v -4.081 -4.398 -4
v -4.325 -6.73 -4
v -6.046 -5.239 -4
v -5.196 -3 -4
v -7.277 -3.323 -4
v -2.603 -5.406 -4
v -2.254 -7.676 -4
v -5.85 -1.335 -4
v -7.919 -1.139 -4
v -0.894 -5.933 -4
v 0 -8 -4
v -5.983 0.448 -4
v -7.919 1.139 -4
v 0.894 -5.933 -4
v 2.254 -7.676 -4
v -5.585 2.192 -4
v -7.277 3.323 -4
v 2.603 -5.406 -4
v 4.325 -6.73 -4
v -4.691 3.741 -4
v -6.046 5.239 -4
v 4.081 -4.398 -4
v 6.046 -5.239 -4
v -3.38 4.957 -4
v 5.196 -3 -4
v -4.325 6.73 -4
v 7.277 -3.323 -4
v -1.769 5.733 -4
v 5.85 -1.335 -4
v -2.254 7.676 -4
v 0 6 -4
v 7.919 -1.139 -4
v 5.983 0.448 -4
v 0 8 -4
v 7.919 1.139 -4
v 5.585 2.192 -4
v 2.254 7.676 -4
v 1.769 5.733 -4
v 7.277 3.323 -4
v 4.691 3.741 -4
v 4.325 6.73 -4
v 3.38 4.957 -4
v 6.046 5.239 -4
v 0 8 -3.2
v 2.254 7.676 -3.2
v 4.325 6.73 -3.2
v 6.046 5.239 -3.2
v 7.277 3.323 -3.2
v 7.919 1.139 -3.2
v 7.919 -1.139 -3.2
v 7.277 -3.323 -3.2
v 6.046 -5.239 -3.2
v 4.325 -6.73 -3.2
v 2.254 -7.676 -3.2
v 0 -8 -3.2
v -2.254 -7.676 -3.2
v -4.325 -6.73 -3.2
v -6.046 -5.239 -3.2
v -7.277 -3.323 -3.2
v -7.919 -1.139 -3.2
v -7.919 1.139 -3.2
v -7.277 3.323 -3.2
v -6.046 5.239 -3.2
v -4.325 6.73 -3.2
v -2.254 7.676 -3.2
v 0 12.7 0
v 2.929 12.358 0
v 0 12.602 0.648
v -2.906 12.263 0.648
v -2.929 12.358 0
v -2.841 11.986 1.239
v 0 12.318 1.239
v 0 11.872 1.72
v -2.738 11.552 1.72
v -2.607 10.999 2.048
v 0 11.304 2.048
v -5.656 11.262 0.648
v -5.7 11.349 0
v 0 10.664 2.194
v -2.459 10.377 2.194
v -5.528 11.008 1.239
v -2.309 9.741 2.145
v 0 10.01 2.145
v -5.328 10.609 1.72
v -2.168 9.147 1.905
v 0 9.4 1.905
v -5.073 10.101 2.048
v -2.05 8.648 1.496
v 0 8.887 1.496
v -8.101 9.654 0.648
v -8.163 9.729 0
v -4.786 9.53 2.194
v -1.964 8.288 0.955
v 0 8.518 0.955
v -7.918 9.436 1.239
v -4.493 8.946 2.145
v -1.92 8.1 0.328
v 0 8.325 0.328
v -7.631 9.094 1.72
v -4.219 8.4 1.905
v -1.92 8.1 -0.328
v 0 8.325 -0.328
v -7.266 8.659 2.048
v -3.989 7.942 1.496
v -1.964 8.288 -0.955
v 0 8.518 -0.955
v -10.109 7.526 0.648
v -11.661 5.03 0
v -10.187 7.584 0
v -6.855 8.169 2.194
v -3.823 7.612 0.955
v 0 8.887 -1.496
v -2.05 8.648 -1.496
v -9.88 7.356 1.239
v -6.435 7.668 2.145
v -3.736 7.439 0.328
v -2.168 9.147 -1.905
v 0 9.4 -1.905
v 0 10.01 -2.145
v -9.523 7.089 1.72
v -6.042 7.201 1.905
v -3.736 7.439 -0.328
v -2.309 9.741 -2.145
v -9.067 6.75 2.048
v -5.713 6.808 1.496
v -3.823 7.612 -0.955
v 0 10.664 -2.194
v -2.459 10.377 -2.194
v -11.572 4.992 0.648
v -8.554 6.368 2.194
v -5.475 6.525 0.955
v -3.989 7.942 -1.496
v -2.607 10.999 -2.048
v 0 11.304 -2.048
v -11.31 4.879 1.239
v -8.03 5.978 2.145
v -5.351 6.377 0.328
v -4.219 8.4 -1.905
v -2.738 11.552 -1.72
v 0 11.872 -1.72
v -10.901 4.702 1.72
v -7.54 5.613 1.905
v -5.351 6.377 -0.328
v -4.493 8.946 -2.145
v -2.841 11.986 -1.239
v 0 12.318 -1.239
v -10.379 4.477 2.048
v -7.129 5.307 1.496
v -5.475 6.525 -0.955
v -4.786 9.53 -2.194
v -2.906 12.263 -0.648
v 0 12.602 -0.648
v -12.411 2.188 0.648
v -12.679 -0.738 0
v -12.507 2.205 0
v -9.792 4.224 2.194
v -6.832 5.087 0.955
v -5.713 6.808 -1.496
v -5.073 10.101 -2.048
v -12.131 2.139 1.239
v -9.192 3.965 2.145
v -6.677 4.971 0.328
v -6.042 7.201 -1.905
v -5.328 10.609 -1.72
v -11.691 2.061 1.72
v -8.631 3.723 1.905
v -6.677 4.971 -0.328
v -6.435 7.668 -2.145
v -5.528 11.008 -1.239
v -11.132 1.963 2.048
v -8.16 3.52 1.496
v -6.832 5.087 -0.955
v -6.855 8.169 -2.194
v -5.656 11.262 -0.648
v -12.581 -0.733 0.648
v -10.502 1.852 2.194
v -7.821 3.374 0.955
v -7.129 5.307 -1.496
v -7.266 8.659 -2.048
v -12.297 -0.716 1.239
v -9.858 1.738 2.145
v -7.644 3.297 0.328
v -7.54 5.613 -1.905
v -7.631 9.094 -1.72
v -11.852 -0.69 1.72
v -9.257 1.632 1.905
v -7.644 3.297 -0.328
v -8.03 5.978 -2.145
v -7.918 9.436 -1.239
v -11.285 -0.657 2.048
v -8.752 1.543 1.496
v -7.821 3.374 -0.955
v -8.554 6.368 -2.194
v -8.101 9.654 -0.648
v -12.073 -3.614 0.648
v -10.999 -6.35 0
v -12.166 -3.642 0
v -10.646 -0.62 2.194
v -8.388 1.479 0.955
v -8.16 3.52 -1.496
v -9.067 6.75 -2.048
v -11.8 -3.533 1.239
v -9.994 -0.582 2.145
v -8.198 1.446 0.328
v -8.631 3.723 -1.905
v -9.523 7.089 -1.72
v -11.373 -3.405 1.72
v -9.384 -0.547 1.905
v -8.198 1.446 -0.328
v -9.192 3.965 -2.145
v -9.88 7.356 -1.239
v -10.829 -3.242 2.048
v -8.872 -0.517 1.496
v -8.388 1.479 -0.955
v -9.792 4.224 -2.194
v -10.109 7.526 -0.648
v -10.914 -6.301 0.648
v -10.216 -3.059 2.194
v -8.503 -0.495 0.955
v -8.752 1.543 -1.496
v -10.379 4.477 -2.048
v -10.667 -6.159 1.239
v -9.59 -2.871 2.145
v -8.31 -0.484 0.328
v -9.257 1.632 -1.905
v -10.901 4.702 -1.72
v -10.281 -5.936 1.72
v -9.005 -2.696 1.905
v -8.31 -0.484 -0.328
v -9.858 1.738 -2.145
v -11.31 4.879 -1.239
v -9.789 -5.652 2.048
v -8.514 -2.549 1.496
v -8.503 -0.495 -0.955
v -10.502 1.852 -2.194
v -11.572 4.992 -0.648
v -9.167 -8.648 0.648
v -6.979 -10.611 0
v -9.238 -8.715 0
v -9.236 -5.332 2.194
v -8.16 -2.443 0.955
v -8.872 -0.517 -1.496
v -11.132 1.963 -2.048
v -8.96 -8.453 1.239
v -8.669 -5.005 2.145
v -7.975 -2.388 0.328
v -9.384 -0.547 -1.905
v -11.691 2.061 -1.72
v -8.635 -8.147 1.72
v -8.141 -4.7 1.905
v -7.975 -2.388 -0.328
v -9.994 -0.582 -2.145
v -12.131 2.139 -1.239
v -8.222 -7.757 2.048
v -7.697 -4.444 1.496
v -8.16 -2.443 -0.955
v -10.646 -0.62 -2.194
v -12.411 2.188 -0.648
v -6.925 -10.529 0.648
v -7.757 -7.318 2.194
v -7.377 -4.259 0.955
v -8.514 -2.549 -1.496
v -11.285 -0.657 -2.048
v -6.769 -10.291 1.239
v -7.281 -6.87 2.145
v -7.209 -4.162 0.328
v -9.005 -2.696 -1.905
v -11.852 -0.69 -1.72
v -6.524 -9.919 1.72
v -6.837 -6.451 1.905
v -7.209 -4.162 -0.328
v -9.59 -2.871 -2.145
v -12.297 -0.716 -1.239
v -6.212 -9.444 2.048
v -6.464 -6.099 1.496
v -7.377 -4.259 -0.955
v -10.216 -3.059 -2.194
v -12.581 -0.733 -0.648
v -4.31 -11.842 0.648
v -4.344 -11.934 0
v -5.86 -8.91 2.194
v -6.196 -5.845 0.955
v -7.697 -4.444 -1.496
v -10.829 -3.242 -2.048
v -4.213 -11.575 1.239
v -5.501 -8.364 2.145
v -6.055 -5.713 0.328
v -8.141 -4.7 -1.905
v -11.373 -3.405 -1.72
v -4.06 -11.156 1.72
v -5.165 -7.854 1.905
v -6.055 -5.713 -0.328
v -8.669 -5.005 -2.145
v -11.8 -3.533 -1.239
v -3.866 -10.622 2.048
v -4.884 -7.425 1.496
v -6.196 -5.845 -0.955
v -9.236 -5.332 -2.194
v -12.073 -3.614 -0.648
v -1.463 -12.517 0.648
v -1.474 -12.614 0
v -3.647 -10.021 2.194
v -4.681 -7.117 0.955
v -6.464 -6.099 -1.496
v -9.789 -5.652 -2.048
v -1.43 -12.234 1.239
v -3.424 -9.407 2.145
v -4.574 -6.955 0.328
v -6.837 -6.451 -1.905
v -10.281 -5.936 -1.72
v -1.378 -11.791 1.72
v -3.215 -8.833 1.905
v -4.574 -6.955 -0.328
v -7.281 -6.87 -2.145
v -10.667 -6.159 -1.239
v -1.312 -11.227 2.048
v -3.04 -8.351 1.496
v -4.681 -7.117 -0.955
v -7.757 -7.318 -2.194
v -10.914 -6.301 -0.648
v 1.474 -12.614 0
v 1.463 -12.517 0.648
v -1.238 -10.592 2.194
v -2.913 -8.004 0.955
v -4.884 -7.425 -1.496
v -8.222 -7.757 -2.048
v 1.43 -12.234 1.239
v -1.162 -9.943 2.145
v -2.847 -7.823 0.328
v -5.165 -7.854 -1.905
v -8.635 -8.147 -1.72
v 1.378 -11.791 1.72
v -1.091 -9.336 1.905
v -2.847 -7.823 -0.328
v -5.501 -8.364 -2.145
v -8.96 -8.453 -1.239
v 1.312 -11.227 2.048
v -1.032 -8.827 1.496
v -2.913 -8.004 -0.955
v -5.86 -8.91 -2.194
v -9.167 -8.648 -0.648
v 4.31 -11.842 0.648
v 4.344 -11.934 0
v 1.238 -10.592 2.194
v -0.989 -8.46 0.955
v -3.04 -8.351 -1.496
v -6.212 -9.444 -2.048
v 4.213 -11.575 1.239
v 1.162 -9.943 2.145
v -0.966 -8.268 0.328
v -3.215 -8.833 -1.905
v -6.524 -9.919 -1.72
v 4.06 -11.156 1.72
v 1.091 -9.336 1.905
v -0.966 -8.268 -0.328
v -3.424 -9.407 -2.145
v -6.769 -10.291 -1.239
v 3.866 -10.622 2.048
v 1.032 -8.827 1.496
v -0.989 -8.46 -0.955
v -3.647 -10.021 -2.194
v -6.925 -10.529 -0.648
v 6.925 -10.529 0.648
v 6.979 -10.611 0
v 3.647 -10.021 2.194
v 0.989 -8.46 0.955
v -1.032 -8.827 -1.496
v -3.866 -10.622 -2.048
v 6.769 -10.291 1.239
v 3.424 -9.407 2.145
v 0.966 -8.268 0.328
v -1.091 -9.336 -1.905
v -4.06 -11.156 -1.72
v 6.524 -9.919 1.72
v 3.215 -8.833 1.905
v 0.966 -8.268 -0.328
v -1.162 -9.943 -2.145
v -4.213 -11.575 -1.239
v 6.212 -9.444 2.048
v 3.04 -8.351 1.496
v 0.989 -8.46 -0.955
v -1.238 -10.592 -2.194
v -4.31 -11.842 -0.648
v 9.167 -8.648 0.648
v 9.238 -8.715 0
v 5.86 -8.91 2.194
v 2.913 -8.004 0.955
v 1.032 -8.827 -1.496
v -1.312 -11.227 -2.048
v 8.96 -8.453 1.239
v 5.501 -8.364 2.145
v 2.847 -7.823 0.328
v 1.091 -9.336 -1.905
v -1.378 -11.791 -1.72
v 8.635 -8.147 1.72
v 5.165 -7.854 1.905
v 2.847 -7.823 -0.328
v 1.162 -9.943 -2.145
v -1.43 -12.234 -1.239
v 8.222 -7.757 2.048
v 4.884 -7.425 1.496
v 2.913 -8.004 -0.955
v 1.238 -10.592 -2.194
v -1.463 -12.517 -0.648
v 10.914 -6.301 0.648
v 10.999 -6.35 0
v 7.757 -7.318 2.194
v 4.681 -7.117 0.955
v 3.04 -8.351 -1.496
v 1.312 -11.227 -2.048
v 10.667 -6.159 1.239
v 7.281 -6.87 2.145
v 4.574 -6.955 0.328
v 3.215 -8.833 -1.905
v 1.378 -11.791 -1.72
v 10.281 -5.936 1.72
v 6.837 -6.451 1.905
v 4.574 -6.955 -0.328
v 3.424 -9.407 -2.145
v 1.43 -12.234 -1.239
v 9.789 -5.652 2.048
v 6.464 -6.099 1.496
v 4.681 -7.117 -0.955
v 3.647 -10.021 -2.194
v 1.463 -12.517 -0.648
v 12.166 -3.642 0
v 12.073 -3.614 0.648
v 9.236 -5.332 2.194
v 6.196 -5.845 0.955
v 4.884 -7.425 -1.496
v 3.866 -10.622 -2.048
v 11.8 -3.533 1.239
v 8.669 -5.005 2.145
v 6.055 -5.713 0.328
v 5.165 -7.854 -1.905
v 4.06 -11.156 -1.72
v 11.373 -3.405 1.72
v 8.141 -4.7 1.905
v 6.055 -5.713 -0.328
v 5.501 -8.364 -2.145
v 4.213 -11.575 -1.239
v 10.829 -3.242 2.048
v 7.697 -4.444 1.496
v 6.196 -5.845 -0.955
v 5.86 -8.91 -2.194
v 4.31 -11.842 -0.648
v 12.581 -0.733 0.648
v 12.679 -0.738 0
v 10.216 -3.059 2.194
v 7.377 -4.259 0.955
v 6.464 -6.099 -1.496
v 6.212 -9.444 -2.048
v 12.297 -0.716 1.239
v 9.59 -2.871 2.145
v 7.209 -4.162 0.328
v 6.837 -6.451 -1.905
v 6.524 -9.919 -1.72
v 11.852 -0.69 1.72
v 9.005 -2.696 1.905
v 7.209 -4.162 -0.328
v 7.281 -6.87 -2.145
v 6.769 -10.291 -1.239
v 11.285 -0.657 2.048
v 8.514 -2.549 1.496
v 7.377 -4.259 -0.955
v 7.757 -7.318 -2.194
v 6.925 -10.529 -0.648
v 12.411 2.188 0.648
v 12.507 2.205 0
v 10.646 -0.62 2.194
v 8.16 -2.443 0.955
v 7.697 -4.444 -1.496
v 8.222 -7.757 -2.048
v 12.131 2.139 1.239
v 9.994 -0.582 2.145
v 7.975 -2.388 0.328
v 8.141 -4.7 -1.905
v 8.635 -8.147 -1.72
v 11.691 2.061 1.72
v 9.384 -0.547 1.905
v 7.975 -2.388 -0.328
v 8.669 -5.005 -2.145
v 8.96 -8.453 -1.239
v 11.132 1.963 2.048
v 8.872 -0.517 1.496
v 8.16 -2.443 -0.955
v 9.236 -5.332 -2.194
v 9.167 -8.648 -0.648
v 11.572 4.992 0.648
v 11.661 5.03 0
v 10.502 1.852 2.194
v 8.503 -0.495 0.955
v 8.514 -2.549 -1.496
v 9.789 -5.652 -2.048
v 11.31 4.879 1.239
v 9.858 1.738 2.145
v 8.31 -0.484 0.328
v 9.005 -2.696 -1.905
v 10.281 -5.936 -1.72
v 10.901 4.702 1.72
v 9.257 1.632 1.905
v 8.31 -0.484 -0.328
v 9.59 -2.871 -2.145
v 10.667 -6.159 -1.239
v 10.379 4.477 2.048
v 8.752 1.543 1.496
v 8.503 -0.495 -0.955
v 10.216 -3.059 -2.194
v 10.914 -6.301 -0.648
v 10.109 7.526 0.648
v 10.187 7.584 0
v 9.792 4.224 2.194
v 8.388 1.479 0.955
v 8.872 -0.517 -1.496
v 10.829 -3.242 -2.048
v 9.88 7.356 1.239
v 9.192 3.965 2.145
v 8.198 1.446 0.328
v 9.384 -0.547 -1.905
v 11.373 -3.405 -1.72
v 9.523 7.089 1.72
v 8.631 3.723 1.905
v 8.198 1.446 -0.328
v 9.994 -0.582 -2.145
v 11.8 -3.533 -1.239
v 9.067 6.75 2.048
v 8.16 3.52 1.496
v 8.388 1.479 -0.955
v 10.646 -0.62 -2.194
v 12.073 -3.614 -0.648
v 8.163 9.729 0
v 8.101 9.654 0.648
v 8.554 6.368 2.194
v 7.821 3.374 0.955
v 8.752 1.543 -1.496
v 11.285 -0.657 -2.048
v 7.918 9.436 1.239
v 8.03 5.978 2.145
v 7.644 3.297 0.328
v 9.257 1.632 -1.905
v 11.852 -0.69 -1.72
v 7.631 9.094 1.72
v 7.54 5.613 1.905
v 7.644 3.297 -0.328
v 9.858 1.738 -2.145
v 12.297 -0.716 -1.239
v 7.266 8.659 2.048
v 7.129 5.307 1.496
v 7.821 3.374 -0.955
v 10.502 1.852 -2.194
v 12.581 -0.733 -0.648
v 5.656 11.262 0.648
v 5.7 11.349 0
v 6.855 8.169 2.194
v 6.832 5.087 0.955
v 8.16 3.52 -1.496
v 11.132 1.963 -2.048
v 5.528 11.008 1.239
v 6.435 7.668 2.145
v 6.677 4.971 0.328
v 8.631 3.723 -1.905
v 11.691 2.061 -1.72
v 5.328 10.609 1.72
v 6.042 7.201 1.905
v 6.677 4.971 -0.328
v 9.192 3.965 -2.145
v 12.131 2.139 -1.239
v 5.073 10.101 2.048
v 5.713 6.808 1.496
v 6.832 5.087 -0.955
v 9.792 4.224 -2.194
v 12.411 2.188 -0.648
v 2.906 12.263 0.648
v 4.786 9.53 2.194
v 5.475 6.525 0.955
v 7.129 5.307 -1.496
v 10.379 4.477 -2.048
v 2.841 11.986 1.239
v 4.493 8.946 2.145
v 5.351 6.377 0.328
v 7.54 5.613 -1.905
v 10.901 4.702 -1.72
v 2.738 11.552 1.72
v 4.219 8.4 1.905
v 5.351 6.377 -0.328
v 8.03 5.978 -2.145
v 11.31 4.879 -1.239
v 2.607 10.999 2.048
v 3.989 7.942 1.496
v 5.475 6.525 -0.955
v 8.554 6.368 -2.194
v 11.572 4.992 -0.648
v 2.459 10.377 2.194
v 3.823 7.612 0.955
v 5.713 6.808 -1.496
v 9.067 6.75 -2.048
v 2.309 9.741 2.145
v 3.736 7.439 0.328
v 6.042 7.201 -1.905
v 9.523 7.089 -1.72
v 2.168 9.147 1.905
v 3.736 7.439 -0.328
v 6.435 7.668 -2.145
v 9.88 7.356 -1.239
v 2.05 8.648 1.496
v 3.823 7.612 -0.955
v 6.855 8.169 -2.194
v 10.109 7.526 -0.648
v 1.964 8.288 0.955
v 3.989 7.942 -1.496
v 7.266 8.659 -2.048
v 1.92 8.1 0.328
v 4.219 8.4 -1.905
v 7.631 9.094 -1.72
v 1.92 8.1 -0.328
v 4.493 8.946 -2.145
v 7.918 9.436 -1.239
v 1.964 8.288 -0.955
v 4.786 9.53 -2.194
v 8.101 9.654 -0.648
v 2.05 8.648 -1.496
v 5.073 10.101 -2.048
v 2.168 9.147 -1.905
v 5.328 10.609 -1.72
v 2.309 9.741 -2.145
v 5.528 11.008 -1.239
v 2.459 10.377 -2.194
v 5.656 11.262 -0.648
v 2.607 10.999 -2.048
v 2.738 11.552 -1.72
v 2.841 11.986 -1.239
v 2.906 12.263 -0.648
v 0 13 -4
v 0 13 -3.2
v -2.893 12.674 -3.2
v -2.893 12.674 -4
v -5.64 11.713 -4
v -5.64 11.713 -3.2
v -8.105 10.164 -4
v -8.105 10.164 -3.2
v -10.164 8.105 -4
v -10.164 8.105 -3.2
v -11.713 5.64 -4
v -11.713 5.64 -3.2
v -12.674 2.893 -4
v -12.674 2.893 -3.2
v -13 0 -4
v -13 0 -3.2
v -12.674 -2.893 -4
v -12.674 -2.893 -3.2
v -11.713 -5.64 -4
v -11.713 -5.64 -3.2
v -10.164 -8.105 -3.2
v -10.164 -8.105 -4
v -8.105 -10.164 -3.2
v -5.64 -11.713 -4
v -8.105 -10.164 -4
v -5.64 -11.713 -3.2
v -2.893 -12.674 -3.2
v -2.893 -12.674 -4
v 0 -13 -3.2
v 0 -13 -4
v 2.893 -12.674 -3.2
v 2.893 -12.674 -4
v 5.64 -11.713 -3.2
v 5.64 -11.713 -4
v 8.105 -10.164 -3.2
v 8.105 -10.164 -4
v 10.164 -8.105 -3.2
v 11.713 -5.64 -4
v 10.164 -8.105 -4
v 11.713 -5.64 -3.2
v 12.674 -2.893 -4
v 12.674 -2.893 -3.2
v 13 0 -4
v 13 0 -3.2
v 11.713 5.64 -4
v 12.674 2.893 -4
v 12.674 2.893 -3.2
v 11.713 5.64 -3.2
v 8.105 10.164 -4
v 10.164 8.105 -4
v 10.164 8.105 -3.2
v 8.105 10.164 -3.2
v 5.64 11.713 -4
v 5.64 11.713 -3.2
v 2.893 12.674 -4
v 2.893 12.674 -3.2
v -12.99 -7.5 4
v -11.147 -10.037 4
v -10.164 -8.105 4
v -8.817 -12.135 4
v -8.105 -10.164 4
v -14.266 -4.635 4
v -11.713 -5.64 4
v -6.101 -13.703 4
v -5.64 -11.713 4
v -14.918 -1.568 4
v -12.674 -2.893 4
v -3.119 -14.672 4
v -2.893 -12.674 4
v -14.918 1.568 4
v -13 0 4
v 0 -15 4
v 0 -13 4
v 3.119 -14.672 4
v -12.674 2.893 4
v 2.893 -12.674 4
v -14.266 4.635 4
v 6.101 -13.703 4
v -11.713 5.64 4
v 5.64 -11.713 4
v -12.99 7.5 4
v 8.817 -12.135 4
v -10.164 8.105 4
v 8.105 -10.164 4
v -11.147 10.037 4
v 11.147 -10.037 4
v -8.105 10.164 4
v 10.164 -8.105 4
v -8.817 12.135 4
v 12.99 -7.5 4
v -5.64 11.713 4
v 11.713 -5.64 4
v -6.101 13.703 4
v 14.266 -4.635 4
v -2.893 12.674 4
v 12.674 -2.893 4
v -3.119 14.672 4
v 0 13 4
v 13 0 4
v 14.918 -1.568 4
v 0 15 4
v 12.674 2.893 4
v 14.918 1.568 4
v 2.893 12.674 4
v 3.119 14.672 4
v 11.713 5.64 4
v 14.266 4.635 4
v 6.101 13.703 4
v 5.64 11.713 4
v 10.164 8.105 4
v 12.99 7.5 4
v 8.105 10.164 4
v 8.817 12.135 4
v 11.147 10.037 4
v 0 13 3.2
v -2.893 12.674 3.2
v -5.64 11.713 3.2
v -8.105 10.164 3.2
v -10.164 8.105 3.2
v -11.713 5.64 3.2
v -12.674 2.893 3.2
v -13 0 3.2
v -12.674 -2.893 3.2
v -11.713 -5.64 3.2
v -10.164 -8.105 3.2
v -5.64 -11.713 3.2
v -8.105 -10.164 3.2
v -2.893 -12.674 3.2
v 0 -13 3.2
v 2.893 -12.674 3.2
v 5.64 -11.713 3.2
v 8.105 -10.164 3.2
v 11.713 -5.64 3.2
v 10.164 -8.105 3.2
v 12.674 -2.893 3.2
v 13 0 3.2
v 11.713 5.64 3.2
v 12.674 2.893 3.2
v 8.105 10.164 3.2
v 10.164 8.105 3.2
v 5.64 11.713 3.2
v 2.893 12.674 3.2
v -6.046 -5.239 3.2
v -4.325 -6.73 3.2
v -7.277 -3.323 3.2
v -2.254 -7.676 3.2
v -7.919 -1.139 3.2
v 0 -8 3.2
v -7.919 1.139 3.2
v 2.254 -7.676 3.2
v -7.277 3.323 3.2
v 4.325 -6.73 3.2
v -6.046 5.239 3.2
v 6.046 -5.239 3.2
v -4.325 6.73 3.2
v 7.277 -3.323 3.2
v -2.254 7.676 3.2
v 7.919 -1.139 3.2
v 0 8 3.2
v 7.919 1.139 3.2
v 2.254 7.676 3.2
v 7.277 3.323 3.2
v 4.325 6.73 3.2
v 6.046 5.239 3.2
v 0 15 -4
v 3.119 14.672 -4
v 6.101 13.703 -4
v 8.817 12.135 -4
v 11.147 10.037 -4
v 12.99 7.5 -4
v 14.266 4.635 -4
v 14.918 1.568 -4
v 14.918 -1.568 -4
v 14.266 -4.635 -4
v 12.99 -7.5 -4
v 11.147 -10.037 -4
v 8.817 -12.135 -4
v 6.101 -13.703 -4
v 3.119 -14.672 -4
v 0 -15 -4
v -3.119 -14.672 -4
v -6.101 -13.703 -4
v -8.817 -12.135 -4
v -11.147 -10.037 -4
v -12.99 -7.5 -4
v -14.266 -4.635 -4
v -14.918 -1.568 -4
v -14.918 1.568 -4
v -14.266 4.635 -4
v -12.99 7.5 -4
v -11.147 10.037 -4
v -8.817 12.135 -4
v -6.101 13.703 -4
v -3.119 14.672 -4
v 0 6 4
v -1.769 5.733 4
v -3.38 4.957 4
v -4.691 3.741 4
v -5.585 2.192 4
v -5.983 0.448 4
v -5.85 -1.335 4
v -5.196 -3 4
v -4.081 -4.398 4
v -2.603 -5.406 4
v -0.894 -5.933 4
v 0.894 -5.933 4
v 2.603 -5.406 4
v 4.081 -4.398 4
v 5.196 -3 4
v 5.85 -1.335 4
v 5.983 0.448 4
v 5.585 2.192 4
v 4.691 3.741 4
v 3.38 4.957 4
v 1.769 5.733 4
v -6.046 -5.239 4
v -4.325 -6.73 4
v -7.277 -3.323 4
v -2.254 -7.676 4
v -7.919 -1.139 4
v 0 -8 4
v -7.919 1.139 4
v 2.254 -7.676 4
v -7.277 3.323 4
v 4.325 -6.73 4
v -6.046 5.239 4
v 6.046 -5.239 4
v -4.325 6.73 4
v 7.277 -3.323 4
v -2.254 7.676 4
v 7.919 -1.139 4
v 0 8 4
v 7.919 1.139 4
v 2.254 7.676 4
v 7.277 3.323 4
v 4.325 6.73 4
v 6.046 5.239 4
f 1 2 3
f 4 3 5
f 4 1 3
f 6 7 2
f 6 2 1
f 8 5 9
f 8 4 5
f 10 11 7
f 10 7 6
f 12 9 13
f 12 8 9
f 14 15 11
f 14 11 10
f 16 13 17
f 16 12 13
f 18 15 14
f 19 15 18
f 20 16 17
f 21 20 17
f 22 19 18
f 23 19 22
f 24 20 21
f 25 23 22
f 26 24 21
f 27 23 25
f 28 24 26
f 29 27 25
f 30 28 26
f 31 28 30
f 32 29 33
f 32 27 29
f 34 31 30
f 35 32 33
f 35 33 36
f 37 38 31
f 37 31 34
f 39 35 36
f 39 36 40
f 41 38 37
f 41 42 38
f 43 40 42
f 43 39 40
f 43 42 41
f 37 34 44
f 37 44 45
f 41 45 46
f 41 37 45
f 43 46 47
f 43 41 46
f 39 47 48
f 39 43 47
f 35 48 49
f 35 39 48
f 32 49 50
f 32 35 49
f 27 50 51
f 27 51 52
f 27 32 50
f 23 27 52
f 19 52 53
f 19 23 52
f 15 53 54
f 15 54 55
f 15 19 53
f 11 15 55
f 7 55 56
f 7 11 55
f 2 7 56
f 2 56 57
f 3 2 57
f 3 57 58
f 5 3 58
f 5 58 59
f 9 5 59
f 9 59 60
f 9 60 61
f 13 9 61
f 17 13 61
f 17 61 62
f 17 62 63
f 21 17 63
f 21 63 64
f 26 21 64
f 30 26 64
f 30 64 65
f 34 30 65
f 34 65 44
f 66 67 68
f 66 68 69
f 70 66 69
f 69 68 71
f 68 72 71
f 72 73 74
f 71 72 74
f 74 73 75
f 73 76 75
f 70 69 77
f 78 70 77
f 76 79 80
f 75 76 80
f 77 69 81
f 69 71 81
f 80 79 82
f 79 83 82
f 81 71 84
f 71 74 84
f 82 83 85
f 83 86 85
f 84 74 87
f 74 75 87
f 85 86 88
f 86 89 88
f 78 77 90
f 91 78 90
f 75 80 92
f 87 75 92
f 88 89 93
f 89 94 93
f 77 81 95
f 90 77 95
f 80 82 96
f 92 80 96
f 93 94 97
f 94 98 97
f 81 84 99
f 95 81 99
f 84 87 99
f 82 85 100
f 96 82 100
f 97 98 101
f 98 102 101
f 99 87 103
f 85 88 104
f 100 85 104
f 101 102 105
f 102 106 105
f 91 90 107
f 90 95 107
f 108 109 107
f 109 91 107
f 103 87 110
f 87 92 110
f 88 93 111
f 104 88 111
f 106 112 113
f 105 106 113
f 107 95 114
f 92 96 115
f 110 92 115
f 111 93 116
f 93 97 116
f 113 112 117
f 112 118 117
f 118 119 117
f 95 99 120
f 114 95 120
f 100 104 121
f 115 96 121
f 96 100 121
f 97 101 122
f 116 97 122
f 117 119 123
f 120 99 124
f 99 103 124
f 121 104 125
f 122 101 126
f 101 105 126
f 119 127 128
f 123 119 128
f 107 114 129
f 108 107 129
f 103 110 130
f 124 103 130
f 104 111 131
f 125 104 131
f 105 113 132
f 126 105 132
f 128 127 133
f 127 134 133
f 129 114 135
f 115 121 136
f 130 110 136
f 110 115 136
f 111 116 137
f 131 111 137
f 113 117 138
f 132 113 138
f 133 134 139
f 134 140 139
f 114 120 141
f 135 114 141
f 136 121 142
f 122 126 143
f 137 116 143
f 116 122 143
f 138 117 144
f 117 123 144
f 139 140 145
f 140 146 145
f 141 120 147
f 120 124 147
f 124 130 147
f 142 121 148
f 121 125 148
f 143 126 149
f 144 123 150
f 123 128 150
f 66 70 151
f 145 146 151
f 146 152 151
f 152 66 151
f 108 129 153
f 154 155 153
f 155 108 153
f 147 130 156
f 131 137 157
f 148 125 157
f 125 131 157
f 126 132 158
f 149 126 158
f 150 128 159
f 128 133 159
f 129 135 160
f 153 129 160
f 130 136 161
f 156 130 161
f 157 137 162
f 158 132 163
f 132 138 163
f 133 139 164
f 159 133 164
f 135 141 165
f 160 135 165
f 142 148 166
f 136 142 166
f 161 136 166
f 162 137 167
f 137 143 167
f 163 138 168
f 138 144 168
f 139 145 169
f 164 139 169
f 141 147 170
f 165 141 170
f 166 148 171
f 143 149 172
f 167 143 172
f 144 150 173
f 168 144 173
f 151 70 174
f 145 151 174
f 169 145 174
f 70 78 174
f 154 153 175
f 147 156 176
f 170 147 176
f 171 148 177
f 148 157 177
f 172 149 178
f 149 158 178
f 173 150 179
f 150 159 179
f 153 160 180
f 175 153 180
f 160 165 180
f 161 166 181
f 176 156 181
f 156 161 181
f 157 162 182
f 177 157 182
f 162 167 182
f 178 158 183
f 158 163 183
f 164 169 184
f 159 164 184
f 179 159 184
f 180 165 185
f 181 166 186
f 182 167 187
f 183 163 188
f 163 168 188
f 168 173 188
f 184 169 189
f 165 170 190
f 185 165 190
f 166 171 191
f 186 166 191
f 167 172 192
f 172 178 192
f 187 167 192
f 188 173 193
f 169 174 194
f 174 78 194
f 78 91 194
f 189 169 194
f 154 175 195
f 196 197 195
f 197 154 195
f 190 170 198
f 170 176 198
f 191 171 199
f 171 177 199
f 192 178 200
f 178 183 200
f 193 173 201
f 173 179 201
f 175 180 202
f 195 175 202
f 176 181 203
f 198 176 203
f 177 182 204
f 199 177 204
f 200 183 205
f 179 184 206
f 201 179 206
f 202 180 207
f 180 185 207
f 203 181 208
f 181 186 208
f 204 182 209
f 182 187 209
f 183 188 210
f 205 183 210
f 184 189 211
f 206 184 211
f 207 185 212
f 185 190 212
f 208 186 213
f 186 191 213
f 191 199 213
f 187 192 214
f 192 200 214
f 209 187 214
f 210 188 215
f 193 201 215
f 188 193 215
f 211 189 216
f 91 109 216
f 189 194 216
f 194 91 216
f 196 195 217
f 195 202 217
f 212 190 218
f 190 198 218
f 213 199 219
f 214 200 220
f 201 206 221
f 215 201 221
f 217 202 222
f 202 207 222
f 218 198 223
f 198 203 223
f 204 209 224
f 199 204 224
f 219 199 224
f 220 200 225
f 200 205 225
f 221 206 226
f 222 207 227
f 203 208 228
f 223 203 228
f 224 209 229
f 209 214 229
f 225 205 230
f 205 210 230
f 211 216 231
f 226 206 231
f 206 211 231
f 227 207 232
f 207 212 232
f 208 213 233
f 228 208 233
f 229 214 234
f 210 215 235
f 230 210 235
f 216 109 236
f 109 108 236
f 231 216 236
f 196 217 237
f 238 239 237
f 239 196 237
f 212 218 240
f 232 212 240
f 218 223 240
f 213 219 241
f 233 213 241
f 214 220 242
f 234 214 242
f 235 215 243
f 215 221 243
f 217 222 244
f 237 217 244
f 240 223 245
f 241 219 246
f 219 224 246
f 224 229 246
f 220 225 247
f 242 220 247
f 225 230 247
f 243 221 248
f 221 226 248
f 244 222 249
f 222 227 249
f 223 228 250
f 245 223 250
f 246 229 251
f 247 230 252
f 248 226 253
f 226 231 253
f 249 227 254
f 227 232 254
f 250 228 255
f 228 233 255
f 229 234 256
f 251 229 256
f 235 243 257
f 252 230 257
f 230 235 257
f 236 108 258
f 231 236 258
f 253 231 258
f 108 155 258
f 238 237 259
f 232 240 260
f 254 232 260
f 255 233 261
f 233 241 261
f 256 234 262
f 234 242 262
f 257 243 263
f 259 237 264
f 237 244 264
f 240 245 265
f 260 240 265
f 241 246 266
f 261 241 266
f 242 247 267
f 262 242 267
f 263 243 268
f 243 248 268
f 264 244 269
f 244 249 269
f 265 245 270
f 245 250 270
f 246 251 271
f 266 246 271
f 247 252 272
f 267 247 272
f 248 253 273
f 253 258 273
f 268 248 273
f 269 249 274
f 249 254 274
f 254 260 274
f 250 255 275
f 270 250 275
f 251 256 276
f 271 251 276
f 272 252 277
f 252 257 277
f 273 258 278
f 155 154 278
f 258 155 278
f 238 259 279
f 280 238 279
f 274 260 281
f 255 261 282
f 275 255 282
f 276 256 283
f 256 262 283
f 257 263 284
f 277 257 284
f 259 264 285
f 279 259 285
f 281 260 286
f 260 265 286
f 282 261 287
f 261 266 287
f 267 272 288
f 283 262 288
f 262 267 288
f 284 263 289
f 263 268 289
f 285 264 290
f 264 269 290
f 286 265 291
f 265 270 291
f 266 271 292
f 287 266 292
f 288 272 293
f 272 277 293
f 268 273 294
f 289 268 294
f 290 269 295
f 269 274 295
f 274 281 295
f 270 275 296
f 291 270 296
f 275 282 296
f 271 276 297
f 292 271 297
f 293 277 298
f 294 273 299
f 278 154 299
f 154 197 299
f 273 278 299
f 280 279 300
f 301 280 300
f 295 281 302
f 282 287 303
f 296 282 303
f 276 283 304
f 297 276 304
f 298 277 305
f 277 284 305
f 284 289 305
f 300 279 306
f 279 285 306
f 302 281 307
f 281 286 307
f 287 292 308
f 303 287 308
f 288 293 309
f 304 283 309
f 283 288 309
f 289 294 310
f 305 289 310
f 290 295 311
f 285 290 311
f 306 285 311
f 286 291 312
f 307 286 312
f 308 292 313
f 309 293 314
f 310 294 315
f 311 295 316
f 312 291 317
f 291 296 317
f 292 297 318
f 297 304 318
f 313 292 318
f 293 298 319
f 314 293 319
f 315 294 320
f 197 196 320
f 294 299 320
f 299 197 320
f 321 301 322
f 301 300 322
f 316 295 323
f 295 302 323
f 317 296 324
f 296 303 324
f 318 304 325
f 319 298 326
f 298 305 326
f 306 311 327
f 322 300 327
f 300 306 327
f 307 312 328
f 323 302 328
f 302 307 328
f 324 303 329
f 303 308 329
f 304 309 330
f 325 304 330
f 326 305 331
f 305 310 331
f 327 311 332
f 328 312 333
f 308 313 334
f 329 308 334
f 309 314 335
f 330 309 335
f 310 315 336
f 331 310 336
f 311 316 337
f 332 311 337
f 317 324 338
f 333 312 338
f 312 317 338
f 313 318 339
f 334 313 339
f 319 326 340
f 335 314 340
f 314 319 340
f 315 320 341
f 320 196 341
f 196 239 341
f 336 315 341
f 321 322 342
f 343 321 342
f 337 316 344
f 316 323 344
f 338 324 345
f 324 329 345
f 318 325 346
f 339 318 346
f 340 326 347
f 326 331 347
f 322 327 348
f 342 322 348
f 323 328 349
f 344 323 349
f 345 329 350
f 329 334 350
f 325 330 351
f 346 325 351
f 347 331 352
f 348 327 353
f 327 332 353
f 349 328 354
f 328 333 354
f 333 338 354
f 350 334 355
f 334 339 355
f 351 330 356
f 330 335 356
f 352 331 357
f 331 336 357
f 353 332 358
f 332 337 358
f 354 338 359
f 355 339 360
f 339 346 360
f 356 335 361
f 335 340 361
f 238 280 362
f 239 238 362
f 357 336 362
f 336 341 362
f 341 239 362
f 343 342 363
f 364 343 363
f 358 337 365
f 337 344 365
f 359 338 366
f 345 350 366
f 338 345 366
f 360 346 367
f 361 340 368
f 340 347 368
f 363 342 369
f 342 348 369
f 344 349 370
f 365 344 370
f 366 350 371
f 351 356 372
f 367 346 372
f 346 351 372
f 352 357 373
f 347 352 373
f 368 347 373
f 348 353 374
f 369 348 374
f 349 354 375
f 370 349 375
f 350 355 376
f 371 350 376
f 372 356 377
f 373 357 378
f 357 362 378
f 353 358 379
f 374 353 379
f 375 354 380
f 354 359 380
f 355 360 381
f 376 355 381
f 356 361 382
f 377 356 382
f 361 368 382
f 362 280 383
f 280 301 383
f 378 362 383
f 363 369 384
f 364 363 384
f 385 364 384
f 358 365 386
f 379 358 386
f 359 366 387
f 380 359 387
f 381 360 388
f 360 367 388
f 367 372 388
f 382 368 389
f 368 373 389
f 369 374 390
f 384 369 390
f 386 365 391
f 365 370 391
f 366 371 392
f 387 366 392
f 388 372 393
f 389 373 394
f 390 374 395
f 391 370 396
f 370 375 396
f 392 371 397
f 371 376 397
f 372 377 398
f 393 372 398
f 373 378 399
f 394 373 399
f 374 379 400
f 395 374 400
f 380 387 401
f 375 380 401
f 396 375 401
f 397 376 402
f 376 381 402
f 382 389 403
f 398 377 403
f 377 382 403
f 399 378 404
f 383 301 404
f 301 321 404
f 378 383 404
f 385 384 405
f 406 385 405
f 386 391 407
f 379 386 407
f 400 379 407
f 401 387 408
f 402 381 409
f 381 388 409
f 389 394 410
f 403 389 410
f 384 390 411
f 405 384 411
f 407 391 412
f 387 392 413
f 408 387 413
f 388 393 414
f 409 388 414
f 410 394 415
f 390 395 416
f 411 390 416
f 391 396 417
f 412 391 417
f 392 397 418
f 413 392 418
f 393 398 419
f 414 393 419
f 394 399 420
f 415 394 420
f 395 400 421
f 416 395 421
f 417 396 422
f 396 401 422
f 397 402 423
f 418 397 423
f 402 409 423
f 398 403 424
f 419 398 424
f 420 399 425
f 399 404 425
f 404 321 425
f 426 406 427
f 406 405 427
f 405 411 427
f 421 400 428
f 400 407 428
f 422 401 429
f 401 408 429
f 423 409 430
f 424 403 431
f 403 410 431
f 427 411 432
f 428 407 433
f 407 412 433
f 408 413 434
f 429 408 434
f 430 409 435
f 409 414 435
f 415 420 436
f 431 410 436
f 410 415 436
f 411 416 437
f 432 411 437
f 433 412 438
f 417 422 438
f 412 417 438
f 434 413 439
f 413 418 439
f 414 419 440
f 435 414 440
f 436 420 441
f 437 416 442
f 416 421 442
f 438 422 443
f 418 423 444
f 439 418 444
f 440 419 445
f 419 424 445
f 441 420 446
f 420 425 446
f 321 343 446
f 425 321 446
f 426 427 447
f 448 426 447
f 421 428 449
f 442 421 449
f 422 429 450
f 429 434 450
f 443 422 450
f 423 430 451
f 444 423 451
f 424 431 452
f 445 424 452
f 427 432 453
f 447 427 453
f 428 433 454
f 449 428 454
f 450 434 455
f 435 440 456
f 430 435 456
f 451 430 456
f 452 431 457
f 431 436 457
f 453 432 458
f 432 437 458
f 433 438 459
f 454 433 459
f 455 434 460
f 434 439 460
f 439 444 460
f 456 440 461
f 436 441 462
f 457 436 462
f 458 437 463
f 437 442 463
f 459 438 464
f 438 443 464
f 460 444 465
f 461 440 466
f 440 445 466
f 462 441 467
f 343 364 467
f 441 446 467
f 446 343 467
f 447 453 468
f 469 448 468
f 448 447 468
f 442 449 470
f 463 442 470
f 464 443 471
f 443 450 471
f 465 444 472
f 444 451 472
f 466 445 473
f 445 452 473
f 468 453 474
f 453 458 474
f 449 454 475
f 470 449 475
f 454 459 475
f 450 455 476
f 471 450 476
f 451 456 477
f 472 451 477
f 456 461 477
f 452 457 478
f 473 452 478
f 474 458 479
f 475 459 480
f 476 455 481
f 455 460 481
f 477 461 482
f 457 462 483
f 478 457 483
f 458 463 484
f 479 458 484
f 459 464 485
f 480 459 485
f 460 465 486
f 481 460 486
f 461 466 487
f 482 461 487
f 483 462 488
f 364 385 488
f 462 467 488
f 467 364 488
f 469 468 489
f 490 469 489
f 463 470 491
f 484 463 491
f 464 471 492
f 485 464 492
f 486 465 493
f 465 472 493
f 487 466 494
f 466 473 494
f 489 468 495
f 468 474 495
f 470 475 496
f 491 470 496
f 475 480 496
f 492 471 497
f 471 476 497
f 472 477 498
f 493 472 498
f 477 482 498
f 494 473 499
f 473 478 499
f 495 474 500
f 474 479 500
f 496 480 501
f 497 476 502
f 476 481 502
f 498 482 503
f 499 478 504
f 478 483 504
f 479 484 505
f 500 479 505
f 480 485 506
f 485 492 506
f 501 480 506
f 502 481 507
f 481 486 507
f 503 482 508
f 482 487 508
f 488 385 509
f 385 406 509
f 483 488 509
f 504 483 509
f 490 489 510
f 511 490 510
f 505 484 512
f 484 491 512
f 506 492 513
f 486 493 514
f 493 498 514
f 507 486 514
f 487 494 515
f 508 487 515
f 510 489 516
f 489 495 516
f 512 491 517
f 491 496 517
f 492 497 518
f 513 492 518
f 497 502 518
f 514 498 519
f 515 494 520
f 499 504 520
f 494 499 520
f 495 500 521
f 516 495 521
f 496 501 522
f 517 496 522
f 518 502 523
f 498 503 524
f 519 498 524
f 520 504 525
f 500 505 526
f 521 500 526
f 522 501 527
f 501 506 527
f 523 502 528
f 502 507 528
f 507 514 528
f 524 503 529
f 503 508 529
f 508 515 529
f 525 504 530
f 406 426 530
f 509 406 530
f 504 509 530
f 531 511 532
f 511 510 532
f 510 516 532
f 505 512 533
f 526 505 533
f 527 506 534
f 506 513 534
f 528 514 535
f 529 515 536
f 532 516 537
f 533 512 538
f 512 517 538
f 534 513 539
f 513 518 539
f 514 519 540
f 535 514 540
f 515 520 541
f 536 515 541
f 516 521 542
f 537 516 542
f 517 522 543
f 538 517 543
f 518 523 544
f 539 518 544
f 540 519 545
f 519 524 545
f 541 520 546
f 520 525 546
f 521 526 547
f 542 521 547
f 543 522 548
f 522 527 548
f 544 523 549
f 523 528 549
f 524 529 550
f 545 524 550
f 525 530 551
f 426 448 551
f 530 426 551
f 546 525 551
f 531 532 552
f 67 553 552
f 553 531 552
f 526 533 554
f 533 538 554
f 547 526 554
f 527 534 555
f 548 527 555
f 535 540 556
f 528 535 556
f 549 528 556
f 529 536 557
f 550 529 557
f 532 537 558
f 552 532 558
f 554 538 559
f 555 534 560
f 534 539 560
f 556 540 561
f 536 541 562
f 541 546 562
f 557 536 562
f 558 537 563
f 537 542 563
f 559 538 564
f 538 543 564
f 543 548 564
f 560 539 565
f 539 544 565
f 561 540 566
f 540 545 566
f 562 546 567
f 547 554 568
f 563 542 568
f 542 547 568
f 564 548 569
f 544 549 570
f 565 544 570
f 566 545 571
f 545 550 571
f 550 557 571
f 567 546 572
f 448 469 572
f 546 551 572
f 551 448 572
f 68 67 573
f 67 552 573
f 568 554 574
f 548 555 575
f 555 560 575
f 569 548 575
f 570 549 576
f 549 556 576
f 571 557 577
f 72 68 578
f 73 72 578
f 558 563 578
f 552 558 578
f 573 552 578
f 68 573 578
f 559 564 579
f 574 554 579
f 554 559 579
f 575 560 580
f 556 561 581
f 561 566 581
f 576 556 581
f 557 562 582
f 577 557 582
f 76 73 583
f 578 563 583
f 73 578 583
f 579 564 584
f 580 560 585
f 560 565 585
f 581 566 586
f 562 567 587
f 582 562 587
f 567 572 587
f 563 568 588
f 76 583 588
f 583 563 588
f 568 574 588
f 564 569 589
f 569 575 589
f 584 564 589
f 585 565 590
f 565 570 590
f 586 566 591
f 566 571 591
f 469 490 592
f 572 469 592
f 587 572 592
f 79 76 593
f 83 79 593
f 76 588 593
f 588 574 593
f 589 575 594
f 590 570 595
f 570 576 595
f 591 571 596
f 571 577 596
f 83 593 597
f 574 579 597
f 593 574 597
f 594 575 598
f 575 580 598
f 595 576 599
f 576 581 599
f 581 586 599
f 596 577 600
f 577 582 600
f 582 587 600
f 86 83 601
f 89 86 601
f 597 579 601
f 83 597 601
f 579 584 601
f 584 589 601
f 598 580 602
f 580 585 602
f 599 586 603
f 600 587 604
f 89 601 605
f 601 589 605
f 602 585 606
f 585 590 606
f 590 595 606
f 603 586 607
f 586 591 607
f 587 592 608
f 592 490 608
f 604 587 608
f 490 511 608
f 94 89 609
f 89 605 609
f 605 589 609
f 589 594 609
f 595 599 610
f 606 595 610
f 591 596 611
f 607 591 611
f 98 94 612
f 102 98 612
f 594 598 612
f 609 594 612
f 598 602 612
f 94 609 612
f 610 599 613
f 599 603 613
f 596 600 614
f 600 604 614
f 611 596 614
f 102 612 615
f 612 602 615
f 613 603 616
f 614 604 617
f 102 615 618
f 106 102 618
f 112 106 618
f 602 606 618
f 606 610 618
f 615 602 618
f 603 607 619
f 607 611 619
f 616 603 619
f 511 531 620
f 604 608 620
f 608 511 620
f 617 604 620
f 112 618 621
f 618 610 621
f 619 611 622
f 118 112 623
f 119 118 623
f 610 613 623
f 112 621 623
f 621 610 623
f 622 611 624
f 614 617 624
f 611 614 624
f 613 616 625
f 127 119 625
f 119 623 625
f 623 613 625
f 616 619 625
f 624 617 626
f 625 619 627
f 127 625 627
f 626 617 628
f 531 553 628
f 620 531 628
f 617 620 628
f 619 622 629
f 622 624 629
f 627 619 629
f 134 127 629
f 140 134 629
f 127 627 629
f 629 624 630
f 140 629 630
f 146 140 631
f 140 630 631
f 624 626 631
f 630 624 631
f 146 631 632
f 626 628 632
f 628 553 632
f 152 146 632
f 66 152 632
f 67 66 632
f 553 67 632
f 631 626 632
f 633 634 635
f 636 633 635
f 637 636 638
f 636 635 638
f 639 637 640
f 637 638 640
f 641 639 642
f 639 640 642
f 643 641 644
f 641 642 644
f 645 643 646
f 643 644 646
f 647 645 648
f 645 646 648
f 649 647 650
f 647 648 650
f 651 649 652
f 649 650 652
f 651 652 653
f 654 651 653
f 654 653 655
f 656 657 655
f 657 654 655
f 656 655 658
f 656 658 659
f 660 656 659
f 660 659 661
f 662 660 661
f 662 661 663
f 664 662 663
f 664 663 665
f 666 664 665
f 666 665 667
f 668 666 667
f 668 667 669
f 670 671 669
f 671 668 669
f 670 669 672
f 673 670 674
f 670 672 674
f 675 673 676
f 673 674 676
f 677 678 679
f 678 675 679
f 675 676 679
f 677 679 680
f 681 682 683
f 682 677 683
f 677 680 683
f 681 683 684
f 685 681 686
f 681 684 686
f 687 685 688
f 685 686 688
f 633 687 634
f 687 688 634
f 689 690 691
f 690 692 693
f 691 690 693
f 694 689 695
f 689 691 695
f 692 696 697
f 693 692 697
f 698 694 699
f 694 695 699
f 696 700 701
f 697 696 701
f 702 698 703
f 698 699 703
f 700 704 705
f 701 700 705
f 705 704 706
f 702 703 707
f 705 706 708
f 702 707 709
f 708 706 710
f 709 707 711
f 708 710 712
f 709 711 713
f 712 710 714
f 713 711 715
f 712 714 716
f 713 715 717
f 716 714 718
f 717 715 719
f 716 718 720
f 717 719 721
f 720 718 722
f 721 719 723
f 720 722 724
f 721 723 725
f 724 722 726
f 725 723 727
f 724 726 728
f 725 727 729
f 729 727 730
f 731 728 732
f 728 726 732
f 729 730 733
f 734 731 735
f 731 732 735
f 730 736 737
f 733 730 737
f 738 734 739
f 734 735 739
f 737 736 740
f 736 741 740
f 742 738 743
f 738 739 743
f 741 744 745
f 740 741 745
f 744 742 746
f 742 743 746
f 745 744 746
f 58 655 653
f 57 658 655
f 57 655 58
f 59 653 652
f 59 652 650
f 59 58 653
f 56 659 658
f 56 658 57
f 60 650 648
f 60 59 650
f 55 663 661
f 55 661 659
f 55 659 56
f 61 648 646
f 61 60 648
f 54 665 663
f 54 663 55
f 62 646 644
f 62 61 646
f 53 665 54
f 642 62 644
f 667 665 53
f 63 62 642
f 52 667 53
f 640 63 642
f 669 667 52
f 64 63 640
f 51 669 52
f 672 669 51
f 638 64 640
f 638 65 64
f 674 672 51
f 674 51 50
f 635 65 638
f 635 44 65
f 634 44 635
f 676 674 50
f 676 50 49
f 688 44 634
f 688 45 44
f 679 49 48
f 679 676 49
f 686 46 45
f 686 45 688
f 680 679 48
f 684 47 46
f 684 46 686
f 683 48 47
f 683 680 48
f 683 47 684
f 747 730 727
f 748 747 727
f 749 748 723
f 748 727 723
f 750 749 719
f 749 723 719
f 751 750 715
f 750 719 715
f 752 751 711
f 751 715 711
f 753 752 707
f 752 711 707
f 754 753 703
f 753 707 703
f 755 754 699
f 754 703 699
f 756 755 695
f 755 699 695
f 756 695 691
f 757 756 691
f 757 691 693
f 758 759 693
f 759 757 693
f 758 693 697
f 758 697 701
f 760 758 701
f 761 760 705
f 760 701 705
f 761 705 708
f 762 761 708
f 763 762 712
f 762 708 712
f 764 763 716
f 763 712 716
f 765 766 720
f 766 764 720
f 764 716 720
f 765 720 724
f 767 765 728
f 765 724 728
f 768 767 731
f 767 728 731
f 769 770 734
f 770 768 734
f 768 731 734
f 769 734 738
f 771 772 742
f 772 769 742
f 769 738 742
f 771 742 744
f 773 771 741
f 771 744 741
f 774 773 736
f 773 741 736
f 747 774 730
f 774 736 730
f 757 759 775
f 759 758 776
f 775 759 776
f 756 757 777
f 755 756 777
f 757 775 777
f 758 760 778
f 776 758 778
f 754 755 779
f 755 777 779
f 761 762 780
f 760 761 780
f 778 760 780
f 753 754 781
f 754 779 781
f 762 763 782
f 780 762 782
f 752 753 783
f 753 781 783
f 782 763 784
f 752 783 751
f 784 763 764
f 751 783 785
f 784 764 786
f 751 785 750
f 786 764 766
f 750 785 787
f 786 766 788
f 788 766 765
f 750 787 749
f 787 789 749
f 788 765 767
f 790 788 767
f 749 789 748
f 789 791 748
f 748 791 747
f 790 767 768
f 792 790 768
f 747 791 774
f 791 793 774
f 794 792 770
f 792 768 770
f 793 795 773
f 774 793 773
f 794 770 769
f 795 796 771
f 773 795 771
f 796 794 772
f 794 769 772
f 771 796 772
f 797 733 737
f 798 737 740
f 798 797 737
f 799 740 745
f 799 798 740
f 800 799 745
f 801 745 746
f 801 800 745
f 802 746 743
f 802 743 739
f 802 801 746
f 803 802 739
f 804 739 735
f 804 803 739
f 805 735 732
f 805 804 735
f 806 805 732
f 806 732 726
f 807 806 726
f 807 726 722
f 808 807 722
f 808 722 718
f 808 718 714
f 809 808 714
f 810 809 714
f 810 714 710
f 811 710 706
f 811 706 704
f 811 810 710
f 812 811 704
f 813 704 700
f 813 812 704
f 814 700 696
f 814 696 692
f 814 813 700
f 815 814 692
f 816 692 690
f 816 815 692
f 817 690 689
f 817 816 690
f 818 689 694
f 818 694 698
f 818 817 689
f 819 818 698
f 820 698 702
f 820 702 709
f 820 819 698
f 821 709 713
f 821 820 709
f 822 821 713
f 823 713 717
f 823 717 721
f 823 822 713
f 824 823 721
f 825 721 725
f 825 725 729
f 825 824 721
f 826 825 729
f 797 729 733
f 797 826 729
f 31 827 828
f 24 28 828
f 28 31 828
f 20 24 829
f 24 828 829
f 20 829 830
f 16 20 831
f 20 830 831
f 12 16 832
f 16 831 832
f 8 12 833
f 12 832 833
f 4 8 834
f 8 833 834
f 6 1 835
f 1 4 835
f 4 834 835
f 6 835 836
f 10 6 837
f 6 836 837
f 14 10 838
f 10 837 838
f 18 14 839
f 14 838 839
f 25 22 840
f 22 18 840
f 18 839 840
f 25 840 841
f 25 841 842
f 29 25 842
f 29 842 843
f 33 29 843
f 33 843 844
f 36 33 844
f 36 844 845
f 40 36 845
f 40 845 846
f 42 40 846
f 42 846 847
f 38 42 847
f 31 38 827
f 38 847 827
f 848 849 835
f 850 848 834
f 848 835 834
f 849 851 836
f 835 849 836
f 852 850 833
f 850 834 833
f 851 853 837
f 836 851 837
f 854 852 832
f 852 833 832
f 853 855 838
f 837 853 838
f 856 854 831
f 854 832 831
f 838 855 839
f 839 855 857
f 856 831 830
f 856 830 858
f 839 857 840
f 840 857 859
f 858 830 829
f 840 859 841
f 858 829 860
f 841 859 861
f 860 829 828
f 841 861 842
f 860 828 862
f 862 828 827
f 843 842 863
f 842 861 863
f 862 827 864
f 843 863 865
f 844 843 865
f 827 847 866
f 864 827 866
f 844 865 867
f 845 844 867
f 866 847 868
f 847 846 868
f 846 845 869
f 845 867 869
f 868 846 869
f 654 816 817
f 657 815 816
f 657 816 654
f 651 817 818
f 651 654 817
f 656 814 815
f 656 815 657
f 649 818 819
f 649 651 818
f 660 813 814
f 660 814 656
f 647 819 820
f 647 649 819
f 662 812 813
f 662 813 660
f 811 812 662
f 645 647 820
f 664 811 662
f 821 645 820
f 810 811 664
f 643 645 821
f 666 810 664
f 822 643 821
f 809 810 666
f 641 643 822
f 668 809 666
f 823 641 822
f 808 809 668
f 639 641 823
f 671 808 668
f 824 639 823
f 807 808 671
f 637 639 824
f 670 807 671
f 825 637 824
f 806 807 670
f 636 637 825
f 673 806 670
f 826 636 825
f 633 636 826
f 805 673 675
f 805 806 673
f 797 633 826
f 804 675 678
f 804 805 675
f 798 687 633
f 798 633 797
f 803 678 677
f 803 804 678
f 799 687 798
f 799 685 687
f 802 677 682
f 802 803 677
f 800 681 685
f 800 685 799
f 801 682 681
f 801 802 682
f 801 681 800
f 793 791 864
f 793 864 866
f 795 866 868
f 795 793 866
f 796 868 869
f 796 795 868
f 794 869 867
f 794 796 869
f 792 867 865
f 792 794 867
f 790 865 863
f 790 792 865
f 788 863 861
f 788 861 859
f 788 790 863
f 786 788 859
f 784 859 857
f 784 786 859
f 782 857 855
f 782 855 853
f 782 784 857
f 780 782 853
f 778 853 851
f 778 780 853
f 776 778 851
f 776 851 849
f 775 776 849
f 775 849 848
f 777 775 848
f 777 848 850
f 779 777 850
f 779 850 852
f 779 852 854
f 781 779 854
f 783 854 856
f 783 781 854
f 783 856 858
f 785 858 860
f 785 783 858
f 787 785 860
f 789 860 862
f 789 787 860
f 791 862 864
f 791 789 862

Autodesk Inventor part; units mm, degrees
ref_plane "YZ Plane" through (0, 0, 0) normal (1, 0, 0) x (0, 1, 0)
ref_plane "XZ Plane" through (0, 0, 0) normal (0, 1, 0) x (-1, 0, 0)
ref_plane "XY Plane" through (0, 0, 0) normal (0, 0, 1) x (1, 0, 0)
sketch "Boceto1" plane through (0, 0, 0) normal (1, 0, 0) x (0, 1, 0)
  line L0 (0, 30.1209) -> (0, -30.1209) construction
  line L1 (15, 4) -> (15, -4)
  line L2 (15, -4) -> (13, -4)
  line L3 (13, -4) -> (13, -3.2)
  line L4 (13, -3.2) -> (8, -3.2)
  line L5 (8, -3.2) -> (8, -4)
  line L6 (8, -4) -> (6, -4)
  line L7 (6, -4) -> (6, 4)
  line L8 (6, 4) -> (8, 4)
  line L9 (8, 4) -> (8, 3.2)
  line L10 (8, 3.2) -> (13, 3.2)
  line L11 (13, 3.2) -> (13, 4)
  line L12 (15, 4) -> (13, 4)
  circle A0 centre (10.5, 0) radius 2.2
  point P0 (0, 0)
  point P1 (0, 0)
  point P2 (6, 0)
  point P3 (10.5, -3.2)
  dimension "d0" = 1
  dimension "d1" = 0.3
  dimension "d2" = 30
  dimension "d3" = 8
  dimension "d4" = 0.8
  dimension "d5" = 2
  dimension "d6" = 12
revolve "Revolución1" add sketch "Boceto1" angle 360 about axis through (0, 0, 30.1209) along (0, 0, -1)
properties part number "rodamiento"
